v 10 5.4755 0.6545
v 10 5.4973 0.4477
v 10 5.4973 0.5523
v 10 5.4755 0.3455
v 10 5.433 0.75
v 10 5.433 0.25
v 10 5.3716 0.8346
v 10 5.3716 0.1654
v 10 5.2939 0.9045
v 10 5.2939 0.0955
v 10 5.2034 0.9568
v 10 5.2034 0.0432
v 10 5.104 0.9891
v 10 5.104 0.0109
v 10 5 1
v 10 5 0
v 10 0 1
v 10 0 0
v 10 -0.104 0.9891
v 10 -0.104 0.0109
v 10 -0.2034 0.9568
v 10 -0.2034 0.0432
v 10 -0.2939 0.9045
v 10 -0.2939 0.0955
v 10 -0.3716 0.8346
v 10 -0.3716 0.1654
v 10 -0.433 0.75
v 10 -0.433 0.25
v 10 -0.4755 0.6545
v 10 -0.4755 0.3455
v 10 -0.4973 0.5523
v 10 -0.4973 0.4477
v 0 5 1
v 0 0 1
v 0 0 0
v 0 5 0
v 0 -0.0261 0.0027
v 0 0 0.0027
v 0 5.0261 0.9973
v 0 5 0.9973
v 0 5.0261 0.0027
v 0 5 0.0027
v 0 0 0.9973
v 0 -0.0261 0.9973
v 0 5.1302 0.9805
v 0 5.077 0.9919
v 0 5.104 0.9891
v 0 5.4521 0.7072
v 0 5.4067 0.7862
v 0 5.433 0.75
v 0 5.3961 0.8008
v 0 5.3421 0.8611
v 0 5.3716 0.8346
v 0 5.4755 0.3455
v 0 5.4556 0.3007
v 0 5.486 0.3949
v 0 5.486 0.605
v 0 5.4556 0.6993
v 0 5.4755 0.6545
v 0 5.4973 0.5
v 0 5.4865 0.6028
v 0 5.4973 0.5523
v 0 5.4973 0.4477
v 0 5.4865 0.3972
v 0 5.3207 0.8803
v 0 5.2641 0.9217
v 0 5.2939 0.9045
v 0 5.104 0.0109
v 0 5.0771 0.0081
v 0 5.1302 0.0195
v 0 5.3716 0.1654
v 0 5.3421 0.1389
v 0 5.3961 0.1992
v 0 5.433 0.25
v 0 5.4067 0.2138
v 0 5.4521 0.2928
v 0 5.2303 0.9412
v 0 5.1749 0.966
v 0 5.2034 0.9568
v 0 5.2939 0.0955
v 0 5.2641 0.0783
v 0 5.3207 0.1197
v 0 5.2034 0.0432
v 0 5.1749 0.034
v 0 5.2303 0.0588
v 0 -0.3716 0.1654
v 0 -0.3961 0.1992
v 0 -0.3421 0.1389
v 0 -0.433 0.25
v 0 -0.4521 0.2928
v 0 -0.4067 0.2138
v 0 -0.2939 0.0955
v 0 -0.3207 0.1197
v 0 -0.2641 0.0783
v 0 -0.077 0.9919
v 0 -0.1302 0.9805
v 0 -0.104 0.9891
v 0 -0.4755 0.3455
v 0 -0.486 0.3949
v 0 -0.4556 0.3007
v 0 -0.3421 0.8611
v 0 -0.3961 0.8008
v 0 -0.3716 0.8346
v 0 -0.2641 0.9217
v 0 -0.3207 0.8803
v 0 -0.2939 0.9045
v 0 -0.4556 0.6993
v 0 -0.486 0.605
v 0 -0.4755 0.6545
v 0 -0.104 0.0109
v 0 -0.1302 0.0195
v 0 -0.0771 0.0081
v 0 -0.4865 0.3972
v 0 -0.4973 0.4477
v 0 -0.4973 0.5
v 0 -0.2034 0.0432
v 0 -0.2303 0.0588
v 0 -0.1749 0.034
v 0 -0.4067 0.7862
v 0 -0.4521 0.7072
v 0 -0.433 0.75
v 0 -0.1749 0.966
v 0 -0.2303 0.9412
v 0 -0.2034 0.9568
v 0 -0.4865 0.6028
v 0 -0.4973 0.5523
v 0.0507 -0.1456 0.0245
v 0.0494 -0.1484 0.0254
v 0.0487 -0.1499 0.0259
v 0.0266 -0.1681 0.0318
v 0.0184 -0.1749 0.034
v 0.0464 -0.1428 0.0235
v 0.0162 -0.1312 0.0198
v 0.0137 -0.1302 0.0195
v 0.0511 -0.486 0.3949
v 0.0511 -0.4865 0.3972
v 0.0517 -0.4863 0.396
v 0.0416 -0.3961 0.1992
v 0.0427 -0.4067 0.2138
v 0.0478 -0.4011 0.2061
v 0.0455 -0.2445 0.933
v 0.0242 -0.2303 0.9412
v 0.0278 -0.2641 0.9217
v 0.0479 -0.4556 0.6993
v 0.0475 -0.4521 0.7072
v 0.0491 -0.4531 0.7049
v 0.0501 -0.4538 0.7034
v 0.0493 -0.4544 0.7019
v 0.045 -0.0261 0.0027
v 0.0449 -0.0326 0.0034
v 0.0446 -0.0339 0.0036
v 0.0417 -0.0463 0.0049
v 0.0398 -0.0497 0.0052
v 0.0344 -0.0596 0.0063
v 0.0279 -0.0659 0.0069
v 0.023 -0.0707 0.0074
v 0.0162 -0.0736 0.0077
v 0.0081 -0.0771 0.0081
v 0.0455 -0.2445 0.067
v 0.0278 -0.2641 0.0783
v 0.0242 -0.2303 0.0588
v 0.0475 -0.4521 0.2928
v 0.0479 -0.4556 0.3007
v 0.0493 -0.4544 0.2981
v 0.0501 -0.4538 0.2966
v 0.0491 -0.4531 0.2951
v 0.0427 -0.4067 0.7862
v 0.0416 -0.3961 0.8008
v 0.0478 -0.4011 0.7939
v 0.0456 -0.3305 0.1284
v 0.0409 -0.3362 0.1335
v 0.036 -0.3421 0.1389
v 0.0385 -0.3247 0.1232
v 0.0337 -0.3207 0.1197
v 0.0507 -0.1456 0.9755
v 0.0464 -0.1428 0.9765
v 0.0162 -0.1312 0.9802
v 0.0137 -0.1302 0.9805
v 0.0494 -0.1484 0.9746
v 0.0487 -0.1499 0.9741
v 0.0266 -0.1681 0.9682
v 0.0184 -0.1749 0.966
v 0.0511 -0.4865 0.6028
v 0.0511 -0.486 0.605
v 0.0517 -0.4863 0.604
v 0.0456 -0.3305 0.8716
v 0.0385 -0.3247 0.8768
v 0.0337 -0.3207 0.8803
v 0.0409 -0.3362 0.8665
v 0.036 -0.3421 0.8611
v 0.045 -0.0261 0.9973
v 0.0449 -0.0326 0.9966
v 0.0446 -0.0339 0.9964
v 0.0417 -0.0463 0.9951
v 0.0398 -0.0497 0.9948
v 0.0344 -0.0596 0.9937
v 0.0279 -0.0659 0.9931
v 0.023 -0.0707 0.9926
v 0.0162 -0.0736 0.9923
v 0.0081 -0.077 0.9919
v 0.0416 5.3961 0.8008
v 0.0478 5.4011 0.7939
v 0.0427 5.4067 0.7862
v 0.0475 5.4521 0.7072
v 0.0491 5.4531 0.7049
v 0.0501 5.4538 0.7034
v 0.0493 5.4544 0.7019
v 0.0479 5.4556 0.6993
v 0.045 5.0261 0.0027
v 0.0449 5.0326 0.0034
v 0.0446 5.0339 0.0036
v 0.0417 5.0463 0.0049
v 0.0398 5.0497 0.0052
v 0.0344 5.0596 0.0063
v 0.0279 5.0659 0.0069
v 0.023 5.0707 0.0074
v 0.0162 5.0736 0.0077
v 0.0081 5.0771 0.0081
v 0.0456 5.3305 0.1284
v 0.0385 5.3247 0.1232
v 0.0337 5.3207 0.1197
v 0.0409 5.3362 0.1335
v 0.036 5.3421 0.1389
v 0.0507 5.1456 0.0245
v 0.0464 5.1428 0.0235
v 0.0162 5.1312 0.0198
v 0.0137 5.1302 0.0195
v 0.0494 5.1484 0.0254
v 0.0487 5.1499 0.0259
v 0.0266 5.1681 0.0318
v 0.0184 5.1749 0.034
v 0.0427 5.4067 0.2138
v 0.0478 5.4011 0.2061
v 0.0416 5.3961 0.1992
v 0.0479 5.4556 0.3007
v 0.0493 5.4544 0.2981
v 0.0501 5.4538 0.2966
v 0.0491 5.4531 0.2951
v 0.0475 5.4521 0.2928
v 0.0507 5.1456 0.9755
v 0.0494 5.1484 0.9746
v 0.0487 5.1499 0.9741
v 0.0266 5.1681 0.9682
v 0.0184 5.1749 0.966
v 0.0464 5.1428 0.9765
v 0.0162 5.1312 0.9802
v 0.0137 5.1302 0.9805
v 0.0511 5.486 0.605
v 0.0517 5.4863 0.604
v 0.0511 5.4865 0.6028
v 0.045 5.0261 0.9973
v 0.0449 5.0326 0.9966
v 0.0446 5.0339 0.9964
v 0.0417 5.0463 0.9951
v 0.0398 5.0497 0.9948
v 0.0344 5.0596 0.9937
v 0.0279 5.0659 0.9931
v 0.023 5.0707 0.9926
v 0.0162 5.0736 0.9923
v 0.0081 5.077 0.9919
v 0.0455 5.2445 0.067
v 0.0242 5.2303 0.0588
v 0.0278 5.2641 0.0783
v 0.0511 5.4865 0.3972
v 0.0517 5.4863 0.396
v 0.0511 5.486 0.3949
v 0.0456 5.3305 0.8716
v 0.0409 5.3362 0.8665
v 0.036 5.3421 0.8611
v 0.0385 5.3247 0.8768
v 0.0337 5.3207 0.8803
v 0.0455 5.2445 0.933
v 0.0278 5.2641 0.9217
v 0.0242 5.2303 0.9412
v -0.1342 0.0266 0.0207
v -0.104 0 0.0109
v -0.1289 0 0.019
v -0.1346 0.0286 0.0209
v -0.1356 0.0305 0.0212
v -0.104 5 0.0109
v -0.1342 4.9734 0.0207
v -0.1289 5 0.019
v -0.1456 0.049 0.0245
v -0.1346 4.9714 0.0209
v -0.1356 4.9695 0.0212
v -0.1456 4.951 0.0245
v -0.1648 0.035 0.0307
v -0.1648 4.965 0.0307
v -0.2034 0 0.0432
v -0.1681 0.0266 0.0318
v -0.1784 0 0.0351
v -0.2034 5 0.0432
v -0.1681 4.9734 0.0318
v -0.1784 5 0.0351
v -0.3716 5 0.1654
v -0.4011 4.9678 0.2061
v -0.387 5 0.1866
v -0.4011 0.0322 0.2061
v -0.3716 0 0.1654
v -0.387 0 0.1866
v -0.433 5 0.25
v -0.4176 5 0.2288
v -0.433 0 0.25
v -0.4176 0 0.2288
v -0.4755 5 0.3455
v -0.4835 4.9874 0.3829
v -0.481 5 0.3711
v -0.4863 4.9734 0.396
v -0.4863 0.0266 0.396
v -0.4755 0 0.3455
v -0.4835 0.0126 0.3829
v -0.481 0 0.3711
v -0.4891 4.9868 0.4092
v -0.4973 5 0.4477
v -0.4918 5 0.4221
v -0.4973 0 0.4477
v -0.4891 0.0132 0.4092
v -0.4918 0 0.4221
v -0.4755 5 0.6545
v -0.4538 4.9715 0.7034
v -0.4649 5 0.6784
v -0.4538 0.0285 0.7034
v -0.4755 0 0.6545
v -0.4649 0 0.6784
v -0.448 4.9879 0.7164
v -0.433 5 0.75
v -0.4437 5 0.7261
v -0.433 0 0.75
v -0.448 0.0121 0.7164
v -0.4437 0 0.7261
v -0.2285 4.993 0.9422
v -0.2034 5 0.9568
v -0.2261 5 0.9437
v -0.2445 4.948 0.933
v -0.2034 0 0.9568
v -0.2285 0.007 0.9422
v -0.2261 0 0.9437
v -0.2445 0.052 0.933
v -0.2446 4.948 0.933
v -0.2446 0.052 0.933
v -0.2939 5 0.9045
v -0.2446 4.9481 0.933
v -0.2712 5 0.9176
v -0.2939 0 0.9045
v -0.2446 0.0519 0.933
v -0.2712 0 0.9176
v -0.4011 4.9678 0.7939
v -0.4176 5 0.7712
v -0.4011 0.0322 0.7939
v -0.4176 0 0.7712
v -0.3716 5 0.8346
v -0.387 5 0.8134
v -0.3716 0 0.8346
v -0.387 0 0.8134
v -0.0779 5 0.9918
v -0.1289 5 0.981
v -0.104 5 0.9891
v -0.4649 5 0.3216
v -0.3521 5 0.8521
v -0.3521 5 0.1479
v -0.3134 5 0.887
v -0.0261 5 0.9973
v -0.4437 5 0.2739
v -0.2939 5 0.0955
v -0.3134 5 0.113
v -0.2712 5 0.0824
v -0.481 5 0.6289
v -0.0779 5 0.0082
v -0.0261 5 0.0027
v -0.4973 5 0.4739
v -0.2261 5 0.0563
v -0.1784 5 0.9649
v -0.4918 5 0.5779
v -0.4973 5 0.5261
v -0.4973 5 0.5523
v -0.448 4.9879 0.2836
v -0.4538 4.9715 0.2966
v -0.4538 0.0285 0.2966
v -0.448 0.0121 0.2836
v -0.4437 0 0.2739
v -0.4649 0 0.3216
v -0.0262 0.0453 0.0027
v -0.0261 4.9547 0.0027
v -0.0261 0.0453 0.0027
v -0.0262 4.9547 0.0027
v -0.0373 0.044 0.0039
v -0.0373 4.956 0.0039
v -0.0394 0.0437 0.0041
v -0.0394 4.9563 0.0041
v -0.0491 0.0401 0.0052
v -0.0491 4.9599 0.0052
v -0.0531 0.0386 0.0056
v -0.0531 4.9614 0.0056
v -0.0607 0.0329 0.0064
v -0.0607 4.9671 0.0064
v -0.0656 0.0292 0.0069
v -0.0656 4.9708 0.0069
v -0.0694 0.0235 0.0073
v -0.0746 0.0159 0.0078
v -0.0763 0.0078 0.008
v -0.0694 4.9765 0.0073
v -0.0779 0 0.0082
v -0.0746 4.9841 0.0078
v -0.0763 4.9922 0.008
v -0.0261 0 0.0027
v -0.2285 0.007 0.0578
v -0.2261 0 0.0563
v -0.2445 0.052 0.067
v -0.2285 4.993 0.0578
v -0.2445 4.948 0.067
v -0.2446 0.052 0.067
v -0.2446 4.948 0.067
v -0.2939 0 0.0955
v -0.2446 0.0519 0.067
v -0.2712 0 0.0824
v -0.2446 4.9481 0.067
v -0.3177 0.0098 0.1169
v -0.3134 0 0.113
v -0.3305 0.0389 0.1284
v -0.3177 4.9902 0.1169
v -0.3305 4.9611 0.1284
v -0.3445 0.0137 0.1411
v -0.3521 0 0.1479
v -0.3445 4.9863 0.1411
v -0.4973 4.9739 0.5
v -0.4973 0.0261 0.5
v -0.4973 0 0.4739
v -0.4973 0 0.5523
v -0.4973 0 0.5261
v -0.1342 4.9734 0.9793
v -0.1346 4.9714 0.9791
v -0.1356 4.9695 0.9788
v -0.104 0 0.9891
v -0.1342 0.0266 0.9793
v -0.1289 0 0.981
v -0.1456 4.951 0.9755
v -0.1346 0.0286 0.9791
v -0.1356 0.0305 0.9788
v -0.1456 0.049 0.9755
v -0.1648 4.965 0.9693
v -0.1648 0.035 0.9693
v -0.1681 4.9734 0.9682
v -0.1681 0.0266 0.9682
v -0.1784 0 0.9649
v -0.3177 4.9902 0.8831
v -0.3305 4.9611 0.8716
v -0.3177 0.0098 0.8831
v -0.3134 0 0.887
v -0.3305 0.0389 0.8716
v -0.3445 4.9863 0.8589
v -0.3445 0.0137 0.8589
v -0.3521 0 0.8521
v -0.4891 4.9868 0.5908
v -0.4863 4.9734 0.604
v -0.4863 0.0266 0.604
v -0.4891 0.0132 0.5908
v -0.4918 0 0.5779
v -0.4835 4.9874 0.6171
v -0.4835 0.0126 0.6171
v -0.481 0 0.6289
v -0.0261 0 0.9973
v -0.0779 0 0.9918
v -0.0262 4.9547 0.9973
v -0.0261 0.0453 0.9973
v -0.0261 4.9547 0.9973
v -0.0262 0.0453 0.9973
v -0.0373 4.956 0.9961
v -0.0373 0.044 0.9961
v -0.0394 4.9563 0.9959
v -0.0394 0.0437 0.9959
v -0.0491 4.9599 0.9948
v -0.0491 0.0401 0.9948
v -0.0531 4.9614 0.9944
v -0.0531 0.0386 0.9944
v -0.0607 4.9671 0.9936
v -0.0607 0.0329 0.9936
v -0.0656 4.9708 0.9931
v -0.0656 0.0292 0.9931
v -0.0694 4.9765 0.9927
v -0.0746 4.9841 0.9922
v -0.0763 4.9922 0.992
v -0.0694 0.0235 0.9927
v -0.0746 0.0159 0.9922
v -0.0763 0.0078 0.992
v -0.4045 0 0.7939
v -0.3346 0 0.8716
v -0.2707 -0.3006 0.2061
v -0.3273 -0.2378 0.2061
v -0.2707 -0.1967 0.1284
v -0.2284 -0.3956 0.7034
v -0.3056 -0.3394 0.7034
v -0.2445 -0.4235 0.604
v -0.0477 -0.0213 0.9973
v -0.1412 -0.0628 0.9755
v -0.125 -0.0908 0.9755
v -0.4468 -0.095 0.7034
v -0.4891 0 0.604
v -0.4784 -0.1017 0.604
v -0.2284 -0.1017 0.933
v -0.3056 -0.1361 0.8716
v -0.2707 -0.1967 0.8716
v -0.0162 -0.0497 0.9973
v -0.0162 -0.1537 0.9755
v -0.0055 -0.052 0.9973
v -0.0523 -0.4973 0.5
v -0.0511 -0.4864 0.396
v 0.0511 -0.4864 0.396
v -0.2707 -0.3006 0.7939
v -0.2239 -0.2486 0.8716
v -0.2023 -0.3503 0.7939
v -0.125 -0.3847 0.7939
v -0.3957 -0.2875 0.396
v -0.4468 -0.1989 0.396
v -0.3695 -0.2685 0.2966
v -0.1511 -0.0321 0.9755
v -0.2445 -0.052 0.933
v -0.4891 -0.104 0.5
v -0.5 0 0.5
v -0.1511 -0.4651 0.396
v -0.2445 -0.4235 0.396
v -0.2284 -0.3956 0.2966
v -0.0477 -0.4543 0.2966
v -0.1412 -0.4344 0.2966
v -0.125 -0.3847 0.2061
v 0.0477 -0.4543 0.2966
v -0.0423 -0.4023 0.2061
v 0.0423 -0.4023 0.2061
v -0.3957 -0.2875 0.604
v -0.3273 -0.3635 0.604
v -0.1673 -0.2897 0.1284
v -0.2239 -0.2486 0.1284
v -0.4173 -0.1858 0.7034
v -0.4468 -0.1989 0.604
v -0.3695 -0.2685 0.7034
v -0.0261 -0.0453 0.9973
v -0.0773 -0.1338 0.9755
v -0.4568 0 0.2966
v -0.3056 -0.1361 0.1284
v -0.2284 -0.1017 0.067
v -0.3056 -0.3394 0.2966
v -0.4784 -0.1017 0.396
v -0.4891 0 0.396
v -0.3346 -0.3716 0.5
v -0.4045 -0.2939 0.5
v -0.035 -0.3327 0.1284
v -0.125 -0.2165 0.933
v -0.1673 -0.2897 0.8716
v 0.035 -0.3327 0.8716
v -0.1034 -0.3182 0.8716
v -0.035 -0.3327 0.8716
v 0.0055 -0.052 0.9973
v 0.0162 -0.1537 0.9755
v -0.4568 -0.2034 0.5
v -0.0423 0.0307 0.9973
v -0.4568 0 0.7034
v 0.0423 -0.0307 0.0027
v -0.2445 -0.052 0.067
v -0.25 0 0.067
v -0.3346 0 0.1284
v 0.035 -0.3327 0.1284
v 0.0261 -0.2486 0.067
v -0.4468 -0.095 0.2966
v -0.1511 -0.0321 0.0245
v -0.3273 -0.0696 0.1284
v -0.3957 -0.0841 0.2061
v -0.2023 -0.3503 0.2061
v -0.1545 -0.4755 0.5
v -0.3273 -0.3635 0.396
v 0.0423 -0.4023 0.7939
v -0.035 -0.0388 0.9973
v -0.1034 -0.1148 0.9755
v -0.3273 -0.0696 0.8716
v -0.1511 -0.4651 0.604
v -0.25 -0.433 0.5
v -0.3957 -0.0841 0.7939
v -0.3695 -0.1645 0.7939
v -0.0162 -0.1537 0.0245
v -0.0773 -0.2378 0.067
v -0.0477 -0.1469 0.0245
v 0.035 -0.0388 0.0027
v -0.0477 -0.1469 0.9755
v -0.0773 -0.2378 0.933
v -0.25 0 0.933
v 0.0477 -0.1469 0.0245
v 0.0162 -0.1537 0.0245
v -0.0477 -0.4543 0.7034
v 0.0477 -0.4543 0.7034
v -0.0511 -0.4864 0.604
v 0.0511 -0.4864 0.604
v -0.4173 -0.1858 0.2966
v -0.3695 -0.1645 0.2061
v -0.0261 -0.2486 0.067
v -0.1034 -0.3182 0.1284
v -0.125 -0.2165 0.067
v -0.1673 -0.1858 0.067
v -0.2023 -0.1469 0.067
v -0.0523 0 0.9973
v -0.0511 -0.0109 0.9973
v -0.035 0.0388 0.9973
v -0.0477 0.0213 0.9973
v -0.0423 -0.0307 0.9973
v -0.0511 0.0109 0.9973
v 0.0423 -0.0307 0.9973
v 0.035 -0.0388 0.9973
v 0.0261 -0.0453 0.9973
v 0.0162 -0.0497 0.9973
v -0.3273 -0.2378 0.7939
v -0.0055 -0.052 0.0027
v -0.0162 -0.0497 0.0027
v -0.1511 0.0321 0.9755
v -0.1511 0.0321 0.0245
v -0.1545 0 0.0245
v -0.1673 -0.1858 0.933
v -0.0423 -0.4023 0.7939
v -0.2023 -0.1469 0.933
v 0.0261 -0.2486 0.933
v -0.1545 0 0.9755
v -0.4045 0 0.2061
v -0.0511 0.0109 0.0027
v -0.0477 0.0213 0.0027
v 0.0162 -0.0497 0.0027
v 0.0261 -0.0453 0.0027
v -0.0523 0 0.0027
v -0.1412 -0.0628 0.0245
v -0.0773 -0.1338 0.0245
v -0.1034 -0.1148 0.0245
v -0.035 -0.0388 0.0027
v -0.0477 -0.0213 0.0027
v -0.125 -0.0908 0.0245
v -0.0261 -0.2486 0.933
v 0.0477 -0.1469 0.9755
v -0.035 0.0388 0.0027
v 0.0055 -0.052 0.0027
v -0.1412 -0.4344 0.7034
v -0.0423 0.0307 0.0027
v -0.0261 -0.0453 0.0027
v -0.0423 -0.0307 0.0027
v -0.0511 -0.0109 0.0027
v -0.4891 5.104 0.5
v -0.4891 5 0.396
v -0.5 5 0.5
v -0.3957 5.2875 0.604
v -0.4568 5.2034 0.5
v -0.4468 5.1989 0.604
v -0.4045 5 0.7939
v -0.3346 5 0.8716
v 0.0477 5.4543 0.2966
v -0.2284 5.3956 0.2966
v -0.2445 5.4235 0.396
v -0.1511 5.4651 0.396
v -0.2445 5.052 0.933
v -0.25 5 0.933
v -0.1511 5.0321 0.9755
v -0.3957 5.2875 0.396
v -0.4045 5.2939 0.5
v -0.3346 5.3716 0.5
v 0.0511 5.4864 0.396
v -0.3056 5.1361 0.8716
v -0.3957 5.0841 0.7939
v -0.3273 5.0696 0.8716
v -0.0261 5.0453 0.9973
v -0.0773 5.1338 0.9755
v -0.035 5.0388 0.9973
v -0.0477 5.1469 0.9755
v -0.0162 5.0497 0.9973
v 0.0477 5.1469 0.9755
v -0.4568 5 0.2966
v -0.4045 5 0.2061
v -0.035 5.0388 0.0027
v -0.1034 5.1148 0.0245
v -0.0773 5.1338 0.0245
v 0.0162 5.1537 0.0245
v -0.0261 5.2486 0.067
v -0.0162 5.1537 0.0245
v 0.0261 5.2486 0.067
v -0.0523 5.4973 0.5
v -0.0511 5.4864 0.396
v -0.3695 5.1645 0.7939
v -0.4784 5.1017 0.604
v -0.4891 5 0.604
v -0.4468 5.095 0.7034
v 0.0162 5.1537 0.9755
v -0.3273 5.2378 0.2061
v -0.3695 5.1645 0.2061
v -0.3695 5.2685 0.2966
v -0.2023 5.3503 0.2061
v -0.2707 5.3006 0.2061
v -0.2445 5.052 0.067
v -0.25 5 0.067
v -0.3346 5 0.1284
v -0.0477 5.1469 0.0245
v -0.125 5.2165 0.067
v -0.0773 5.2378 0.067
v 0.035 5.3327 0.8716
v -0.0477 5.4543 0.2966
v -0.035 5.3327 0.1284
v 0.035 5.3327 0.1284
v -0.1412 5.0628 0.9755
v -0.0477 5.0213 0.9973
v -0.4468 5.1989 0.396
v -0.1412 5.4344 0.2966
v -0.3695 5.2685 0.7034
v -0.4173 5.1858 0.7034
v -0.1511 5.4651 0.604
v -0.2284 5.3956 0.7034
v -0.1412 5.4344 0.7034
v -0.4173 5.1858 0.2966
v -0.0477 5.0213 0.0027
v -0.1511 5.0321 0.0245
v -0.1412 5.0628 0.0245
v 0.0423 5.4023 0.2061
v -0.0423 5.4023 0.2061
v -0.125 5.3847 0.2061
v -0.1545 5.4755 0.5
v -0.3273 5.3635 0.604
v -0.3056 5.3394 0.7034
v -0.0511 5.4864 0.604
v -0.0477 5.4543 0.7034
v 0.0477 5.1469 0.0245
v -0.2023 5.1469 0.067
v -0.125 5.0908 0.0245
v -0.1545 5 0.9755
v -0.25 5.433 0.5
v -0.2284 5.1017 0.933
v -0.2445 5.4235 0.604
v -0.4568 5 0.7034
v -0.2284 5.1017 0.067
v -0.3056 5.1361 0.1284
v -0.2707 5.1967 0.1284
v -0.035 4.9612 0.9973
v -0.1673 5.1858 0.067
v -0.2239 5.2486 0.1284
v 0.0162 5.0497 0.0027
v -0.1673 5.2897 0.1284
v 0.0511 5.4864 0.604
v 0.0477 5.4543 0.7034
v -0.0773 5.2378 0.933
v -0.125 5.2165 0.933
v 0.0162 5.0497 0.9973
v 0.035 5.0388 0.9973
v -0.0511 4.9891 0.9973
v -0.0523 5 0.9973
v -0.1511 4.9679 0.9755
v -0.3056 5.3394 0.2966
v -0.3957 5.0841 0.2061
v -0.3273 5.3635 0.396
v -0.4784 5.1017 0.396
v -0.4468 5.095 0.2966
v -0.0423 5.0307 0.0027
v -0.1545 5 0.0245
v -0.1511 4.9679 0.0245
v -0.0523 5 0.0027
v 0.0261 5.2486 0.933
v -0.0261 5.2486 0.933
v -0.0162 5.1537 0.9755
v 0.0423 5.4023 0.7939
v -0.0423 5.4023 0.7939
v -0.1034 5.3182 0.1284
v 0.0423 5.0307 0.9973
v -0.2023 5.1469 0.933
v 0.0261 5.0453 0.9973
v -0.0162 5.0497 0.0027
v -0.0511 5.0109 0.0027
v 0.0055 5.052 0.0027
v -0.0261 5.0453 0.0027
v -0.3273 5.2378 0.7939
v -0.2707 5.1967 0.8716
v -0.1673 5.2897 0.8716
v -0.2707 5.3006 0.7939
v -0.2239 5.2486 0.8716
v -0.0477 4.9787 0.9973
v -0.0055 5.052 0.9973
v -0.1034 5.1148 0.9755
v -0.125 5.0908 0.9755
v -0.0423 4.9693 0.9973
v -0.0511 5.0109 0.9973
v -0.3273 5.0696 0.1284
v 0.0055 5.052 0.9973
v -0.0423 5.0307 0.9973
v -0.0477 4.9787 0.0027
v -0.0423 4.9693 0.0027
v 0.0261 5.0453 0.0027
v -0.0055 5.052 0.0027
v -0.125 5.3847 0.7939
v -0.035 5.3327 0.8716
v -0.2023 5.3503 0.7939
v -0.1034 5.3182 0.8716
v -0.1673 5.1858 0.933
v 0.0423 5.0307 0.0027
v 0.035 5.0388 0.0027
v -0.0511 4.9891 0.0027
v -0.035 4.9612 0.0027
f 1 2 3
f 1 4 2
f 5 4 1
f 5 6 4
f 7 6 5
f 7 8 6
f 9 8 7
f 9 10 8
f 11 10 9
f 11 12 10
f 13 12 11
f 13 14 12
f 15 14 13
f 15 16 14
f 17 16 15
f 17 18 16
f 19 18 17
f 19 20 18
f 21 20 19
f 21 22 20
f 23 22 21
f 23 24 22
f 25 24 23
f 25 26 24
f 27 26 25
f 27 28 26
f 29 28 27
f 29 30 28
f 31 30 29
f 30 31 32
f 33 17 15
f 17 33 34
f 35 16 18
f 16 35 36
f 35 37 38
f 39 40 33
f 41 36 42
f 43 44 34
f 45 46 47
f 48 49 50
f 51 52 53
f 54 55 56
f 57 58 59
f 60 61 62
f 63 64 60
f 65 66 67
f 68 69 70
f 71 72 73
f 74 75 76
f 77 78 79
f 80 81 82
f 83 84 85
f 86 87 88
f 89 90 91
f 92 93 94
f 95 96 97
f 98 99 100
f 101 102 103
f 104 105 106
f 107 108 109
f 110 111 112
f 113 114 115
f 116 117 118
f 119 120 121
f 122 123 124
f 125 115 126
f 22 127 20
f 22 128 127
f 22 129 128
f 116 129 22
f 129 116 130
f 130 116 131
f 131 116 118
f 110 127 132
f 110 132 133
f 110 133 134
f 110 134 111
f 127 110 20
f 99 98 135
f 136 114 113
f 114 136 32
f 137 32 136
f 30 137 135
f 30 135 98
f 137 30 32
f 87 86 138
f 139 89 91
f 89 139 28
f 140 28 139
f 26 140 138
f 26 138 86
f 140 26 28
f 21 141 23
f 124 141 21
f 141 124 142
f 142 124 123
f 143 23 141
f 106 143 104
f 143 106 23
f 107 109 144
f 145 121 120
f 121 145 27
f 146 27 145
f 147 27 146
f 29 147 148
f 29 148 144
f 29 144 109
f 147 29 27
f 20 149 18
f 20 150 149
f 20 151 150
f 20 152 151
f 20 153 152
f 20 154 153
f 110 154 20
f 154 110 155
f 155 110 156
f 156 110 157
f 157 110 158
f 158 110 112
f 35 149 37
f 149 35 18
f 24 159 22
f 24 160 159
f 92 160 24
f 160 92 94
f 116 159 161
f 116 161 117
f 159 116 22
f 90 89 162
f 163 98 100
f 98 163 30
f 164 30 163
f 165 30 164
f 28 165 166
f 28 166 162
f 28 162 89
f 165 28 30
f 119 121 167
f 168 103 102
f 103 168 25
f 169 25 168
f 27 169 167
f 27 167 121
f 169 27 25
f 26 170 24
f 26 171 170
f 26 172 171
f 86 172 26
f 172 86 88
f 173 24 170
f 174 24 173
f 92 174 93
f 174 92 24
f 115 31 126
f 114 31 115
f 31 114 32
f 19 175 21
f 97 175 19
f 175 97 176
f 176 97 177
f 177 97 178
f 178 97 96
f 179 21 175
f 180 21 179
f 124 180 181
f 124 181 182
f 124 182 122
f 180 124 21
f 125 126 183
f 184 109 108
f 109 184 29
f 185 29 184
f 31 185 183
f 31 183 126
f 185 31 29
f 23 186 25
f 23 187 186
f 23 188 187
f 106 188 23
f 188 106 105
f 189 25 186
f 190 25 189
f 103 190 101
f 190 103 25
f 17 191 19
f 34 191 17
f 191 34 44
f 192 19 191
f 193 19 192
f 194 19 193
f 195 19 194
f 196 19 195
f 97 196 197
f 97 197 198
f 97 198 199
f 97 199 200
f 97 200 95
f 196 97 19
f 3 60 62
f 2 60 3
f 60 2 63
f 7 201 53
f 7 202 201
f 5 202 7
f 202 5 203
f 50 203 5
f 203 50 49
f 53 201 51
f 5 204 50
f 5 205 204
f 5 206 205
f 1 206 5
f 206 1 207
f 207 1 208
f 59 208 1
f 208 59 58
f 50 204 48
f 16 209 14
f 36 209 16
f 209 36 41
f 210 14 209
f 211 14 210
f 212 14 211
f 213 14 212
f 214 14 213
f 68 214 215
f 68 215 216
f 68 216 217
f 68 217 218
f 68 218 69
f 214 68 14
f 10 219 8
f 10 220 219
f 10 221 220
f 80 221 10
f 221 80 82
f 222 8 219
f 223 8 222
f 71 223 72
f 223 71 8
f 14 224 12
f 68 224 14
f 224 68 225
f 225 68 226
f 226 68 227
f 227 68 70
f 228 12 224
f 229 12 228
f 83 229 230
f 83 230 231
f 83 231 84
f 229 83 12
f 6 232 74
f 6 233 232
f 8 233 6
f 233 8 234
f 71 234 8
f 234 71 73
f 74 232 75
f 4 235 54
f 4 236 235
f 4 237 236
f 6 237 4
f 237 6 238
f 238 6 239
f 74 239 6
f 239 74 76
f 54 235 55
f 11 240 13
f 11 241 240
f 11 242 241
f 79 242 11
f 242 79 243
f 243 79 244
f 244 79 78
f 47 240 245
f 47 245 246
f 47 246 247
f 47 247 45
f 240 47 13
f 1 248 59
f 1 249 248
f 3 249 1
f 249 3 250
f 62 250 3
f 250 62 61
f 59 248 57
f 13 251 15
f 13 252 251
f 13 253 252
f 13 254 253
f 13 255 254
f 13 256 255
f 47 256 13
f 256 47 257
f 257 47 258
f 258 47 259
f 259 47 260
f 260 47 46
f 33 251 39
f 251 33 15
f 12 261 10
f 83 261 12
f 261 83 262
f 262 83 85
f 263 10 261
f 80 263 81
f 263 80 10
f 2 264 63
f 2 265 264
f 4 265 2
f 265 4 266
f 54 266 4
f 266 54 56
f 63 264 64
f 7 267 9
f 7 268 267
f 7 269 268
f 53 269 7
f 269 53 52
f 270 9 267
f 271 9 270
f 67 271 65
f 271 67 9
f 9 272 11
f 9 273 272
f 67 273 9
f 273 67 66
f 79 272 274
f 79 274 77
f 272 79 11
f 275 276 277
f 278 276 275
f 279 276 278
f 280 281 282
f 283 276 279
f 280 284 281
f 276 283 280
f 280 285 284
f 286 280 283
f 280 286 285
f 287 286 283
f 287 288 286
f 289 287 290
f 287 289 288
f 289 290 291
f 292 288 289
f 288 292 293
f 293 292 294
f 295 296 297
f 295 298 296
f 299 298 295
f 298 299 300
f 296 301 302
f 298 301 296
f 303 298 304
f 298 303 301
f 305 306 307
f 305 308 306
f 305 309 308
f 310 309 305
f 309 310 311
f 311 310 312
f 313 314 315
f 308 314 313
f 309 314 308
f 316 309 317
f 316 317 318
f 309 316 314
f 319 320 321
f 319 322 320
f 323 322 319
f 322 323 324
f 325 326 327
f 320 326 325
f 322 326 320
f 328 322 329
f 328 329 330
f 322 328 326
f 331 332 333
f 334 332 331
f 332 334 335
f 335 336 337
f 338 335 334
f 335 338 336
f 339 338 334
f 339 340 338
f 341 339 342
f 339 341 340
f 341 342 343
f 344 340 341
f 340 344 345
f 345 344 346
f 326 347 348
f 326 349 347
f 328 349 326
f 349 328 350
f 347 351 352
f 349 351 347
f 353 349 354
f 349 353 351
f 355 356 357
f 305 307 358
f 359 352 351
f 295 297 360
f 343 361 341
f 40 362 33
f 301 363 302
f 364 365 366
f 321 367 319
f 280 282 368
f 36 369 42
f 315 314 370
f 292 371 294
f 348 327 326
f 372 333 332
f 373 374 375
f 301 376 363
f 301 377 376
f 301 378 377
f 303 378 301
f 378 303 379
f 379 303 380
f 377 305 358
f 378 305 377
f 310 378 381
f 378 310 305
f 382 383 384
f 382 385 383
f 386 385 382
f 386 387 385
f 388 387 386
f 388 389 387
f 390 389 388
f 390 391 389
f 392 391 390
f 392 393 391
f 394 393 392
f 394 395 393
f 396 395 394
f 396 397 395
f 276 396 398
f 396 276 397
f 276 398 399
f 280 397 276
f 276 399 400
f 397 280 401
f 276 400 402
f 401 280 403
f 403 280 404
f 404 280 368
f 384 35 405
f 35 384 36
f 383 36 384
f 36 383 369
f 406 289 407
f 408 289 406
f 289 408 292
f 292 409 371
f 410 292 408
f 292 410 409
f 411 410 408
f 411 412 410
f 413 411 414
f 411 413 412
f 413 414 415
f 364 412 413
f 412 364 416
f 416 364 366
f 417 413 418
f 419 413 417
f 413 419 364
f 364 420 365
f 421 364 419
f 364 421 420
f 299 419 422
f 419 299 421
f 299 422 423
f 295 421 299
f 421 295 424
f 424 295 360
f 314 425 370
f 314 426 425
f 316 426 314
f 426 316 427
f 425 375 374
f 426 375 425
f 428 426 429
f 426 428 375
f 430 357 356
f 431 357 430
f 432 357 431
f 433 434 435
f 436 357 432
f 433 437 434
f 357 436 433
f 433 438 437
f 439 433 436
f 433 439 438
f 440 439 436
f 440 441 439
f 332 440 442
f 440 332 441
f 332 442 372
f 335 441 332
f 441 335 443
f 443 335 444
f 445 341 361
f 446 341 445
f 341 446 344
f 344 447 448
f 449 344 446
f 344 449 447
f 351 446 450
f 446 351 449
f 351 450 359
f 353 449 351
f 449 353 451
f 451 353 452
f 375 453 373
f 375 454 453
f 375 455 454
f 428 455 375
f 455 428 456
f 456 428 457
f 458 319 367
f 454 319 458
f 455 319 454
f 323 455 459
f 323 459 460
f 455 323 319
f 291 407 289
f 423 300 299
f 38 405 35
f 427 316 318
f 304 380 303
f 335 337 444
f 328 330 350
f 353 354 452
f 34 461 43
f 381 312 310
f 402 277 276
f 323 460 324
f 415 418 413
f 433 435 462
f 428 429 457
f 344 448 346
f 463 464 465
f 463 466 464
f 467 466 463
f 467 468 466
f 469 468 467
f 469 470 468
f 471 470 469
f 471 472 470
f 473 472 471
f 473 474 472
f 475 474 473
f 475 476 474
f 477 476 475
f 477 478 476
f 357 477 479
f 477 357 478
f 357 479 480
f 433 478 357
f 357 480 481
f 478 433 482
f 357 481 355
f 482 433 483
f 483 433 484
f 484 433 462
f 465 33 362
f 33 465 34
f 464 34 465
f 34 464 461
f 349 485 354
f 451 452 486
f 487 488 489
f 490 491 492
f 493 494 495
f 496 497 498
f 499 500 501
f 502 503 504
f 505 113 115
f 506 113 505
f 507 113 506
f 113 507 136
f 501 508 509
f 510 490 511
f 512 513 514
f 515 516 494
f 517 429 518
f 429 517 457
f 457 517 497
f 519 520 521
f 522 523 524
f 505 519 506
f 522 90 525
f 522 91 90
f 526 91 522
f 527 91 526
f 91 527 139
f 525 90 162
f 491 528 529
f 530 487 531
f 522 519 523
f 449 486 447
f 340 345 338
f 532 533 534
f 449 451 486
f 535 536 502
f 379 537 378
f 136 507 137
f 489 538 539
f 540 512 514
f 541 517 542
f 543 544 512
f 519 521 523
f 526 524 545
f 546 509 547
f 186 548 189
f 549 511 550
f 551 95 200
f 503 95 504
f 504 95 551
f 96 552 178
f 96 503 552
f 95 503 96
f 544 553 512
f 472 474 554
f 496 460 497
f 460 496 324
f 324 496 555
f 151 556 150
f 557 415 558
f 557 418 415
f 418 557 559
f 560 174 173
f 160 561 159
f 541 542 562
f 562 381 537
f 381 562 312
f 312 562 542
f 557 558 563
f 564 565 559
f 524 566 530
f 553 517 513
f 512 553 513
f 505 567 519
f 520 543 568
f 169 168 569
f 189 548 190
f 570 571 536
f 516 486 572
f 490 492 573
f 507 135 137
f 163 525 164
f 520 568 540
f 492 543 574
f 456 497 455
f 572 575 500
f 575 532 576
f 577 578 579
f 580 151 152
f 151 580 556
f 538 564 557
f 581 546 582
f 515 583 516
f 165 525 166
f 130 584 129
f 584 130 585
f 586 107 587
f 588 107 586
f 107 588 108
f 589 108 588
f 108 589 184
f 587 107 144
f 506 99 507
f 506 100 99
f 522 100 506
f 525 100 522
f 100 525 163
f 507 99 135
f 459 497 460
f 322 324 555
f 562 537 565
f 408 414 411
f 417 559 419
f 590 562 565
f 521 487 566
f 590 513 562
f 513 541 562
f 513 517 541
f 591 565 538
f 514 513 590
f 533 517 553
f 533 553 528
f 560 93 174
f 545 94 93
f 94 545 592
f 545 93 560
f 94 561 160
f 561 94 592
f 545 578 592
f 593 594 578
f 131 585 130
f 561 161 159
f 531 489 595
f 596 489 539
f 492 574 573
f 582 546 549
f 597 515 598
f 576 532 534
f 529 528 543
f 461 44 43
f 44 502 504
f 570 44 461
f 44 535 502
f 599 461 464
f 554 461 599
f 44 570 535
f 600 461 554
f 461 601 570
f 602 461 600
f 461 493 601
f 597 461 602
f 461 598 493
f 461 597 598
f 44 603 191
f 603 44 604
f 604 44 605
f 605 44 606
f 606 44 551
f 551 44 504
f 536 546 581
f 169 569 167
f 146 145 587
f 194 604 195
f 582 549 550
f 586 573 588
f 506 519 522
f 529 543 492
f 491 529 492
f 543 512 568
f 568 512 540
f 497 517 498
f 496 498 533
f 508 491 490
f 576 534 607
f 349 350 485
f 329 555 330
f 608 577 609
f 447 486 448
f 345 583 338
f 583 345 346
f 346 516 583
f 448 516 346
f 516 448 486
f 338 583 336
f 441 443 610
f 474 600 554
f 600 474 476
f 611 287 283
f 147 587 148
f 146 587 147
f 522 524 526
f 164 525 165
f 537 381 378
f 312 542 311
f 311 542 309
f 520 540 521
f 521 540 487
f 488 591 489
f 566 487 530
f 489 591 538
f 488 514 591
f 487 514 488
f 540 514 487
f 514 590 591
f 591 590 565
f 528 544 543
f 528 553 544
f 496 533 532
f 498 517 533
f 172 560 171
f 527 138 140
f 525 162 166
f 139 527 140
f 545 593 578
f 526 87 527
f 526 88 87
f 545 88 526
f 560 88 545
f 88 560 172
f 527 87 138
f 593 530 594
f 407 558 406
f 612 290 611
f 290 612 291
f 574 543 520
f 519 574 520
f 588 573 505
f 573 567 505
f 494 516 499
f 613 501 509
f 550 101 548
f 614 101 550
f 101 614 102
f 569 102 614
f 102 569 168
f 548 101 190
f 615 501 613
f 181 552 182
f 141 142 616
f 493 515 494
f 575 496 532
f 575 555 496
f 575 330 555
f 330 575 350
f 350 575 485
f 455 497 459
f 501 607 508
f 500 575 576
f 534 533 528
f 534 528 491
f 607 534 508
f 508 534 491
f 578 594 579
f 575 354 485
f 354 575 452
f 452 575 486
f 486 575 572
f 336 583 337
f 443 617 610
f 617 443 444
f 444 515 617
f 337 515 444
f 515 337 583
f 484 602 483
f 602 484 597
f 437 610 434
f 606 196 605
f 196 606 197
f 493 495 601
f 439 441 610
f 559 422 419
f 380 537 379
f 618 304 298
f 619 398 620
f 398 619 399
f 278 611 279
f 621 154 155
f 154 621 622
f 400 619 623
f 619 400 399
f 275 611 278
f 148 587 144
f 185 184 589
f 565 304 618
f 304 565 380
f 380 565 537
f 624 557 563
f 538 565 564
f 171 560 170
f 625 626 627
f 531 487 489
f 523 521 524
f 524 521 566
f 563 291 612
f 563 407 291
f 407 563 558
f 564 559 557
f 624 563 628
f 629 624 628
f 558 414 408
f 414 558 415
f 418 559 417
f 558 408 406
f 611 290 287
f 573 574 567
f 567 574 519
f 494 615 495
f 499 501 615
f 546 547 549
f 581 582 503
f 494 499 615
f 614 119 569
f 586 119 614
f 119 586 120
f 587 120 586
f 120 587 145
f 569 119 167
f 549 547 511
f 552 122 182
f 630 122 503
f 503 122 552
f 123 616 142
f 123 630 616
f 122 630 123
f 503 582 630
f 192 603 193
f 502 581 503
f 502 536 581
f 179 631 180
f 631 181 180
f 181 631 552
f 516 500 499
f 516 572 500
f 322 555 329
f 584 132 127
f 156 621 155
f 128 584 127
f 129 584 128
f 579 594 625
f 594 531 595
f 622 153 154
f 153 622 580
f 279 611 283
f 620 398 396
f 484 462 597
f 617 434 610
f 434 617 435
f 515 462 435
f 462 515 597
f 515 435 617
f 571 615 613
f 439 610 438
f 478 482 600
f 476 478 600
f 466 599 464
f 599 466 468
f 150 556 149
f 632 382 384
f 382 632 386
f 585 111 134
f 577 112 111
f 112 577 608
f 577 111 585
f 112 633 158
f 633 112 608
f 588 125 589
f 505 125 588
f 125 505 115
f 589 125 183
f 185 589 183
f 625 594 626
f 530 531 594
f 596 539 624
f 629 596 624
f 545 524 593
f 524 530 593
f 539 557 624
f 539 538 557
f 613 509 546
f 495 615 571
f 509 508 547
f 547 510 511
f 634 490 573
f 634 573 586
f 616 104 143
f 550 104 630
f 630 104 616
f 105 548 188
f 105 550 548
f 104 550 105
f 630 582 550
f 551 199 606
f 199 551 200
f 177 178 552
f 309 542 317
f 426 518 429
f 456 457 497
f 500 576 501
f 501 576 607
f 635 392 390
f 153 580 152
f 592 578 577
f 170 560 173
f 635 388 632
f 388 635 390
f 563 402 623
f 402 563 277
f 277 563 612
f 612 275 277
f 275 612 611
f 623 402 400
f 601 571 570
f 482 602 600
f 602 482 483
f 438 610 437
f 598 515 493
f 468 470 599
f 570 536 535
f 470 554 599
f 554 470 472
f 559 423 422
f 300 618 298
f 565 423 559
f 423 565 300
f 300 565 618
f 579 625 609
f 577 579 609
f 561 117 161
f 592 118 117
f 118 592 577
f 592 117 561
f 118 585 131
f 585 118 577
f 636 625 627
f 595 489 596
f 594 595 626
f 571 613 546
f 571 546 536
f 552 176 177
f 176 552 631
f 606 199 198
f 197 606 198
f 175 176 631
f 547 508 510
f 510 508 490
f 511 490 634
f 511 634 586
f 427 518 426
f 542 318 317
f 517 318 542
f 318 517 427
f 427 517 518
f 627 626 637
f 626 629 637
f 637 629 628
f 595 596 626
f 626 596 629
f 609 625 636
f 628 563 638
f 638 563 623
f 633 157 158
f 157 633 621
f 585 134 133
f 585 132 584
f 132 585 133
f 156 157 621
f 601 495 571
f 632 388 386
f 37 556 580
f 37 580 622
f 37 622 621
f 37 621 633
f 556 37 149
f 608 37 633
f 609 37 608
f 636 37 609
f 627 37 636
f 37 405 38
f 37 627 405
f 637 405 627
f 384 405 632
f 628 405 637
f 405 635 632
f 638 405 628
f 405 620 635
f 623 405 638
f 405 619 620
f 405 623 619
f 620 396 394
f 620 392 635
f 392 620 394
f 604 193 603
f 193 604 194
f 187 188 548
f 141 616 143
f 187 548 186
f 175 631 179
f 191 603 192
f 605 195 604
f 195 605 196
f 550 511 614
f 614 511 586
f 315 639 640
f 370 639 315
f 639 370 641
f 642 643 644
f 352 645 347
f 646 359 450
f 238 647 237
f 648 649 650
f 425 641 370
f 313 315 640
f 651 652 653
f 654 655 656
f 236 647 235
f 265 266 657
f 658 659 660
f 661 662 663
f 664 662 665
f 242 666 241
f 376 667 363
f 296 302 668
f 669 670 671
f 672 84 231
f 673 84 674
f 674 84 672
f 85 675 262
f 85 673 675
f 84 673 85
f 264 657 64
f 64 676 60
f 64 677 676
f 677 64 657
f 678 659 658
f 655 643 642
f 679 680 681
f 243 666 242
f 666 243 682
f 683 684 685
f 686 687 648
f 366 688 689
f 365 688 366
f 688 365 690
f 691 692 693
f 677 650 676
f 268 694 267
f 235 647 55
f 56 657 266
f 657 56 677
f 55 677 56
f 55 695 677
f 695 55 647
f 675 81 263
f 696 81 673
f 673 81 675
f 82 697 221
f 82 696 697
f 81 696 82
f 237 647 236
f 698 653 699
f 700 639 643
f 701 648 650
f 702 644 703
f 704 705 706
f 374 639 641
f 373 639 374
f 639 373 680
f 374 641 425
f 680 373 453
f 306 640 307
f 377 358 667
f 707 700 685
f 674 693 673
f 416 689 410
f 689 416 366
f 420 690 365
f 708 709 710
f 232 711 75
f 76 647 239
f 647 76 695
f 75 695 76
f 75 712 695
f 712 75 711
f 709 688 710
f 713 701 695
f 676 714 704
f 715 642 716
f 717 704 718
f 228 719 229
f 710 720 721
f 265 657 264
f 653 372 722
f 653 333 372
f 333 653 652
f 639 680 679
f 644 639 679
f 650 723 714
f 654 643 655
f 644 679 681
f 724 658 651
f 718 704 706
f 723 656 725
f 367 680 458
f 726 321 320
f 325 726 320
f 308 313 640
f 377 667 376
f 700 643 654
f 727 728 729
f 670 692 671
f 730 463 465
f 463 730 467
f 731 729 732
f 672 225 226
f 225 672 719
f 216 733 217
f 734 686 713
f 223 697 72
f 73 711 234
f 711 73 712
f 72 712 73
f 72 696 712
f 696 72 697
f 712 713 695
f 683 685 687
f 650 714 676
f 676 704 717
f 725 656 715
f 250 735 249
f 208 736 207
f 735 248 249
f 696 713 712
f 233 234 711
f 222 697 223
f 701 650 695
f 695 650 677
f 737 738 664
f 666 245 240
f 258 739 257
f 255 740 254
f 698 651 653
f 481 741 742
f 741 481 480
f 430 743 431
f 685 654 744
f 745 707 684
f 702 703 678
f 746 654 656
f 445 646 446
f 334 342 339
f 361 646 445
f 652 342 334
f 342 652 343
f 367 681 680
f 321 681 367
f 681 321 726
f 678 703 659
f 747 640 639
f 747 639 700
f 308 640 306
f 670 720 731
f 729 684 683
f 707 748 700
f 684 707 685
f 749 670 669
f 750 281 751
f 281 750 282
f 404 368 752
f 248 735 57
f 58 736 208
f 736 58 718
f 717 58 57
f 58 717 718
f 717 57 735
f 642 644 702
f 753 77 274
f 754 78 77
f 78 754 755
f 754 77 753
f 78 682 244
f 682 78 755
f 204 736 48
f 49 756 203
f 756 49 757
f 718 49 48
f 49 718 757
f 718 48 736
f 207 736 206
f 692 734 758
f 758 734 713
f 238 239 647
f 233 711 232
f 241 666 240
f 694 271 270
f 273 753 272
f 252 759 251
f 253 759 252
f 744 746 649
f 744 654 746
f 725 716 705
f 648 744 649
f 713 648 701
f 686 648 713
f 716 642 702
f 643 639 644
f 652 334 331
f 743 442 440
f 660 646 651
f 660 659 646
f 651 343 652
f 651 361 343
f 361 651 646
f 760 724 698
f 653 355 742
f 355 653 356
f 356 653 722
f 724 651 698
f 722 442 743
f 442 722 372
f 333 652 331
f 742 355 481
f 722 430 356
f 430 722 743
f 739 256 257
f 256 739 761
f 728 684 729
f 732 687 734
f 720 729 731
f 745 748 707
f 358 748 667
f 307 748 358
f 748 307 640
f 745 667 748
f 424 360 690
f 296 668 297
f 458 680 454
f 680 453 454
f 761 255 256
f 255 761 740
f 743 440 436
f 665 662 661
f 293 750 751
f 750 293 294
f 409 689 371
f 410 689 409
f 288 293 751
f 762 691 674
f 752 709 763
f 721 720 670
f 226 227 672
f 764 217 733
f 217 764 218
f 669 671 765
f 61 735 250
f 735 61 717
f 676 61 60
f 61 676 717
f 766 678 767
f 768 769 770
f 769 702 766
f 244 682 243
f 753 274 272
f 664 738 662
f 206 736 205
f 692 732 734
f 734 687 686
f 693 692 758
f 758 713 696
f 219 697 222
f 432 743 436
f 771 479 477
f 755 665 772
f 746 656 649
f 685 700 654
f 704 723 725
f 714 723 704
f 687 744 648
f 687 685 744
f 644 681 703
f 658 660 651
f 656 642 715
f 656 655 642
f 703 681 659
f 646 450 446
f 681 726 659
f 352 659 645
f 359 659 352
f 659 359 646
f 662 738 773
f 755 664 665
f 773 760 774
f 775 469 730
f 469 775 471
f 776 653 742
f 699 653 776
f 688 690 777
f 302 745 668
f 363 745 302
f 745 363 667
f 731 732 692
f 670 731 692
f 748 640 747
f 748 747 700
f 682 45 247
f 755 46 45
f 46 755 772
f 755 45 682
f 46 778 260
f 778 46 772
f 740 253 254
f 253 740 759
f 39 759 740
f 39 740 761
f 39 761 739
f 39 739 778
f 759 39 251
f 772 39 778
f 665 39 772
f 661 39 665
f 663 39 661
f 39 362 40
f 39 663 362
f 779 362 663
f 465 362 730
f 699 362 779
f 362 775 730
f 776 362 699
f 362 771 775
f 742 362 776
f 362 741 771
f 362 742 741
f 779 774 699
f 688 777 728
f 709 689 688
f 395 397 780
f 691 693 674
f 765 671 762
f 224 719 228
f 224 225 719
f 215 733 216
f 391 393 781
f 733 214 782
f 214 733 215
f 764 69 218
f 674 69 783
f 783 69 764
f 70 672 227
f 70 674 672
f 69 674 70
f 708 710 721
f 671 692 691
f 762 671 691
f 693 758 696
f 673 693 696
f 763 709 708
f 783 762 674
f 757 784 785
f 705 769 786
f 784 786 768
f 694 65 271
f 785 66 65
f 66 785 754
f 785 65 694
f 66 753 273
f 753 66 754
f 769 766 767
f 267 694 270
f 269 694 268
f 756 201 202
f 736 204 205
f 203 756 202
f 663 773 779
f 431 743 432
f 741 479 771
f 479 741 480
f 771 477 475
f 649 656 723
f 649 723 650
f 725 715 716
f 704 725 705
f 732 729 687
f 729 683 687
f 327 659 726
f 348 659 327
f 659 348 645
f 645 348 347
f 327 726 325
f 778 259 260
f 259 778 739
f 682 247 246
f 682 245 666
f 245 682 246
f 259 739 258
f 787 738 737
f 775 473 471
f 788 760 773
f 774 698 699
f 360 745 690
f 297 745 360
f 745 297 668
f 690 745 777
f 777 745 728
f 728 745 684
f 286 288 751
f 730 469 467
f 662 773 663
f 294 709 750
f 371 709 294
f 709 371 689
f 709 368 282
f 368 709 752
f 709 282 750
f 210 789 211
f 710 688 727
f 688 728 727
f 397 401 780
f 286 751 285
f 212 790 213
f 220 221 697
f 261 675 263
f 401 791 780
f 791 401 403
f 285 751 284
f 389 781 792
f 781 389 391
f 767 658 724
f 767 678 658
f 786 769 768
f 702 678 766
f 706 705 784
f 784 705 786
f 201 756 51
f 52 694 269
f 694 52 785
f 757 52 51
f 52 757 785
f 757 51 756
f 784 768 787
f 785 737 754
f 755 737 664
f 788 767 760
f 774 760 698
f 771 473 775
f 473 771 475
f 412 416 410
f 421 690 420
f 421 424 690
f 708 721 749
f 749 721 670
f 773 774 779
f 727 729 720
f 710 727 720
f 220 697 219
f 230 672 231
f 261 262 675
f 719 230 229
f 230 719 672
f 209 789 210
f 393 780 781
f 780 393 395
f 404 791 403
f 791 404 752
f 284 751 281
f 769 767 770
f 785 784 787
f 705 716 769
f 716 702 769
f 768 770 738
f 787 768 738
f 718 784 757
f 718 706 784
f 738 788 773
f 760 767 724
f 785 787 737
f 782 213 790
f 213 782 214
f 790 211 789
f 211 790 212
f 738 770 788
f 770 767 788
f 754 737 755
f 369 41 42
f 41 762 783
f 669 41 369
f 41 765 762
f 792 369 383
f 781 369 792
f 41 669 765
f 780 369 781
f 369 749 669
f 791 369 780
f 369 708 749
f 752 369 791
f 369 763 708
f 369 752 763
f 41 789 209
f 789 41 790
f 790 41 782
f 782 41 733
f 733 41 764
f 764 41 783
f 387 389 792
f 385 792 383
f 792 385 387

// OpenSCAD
/// Sled

///< example
translate()sled(10,5,1);
$fn = 30;

///< Def
module sled( w, d, h ){
     center_set = false;
     c_width  = w;
     c_depth  = d;
     c_height = h;
     c_parms = [ c_width, c_depth, c_height ];

     union(){
     color("green")
	  cube(c_parms, center=center_set);
     translate([0,0,c_height/2])
	  rotate([0,90,0])
	  cylinder(h = c_width, d = c_height, center=center_set);
     translate([0, c_depth,c_height/2])
	  rotate([0,90,0])
	  cylinder(h = c_width, d = c_height, center=center_set);
     translate([0,c_depth,c_height/2])
     rotate([90,90,0])
	  cylinder(h = c_depth, d = c_height, center=center_set);
     translate([0,0,c_height/2])
	  sphere(c_height/2);
     translate([0,c_depth,c_height/2])
	  sphere(c_height/2);
     }
}
